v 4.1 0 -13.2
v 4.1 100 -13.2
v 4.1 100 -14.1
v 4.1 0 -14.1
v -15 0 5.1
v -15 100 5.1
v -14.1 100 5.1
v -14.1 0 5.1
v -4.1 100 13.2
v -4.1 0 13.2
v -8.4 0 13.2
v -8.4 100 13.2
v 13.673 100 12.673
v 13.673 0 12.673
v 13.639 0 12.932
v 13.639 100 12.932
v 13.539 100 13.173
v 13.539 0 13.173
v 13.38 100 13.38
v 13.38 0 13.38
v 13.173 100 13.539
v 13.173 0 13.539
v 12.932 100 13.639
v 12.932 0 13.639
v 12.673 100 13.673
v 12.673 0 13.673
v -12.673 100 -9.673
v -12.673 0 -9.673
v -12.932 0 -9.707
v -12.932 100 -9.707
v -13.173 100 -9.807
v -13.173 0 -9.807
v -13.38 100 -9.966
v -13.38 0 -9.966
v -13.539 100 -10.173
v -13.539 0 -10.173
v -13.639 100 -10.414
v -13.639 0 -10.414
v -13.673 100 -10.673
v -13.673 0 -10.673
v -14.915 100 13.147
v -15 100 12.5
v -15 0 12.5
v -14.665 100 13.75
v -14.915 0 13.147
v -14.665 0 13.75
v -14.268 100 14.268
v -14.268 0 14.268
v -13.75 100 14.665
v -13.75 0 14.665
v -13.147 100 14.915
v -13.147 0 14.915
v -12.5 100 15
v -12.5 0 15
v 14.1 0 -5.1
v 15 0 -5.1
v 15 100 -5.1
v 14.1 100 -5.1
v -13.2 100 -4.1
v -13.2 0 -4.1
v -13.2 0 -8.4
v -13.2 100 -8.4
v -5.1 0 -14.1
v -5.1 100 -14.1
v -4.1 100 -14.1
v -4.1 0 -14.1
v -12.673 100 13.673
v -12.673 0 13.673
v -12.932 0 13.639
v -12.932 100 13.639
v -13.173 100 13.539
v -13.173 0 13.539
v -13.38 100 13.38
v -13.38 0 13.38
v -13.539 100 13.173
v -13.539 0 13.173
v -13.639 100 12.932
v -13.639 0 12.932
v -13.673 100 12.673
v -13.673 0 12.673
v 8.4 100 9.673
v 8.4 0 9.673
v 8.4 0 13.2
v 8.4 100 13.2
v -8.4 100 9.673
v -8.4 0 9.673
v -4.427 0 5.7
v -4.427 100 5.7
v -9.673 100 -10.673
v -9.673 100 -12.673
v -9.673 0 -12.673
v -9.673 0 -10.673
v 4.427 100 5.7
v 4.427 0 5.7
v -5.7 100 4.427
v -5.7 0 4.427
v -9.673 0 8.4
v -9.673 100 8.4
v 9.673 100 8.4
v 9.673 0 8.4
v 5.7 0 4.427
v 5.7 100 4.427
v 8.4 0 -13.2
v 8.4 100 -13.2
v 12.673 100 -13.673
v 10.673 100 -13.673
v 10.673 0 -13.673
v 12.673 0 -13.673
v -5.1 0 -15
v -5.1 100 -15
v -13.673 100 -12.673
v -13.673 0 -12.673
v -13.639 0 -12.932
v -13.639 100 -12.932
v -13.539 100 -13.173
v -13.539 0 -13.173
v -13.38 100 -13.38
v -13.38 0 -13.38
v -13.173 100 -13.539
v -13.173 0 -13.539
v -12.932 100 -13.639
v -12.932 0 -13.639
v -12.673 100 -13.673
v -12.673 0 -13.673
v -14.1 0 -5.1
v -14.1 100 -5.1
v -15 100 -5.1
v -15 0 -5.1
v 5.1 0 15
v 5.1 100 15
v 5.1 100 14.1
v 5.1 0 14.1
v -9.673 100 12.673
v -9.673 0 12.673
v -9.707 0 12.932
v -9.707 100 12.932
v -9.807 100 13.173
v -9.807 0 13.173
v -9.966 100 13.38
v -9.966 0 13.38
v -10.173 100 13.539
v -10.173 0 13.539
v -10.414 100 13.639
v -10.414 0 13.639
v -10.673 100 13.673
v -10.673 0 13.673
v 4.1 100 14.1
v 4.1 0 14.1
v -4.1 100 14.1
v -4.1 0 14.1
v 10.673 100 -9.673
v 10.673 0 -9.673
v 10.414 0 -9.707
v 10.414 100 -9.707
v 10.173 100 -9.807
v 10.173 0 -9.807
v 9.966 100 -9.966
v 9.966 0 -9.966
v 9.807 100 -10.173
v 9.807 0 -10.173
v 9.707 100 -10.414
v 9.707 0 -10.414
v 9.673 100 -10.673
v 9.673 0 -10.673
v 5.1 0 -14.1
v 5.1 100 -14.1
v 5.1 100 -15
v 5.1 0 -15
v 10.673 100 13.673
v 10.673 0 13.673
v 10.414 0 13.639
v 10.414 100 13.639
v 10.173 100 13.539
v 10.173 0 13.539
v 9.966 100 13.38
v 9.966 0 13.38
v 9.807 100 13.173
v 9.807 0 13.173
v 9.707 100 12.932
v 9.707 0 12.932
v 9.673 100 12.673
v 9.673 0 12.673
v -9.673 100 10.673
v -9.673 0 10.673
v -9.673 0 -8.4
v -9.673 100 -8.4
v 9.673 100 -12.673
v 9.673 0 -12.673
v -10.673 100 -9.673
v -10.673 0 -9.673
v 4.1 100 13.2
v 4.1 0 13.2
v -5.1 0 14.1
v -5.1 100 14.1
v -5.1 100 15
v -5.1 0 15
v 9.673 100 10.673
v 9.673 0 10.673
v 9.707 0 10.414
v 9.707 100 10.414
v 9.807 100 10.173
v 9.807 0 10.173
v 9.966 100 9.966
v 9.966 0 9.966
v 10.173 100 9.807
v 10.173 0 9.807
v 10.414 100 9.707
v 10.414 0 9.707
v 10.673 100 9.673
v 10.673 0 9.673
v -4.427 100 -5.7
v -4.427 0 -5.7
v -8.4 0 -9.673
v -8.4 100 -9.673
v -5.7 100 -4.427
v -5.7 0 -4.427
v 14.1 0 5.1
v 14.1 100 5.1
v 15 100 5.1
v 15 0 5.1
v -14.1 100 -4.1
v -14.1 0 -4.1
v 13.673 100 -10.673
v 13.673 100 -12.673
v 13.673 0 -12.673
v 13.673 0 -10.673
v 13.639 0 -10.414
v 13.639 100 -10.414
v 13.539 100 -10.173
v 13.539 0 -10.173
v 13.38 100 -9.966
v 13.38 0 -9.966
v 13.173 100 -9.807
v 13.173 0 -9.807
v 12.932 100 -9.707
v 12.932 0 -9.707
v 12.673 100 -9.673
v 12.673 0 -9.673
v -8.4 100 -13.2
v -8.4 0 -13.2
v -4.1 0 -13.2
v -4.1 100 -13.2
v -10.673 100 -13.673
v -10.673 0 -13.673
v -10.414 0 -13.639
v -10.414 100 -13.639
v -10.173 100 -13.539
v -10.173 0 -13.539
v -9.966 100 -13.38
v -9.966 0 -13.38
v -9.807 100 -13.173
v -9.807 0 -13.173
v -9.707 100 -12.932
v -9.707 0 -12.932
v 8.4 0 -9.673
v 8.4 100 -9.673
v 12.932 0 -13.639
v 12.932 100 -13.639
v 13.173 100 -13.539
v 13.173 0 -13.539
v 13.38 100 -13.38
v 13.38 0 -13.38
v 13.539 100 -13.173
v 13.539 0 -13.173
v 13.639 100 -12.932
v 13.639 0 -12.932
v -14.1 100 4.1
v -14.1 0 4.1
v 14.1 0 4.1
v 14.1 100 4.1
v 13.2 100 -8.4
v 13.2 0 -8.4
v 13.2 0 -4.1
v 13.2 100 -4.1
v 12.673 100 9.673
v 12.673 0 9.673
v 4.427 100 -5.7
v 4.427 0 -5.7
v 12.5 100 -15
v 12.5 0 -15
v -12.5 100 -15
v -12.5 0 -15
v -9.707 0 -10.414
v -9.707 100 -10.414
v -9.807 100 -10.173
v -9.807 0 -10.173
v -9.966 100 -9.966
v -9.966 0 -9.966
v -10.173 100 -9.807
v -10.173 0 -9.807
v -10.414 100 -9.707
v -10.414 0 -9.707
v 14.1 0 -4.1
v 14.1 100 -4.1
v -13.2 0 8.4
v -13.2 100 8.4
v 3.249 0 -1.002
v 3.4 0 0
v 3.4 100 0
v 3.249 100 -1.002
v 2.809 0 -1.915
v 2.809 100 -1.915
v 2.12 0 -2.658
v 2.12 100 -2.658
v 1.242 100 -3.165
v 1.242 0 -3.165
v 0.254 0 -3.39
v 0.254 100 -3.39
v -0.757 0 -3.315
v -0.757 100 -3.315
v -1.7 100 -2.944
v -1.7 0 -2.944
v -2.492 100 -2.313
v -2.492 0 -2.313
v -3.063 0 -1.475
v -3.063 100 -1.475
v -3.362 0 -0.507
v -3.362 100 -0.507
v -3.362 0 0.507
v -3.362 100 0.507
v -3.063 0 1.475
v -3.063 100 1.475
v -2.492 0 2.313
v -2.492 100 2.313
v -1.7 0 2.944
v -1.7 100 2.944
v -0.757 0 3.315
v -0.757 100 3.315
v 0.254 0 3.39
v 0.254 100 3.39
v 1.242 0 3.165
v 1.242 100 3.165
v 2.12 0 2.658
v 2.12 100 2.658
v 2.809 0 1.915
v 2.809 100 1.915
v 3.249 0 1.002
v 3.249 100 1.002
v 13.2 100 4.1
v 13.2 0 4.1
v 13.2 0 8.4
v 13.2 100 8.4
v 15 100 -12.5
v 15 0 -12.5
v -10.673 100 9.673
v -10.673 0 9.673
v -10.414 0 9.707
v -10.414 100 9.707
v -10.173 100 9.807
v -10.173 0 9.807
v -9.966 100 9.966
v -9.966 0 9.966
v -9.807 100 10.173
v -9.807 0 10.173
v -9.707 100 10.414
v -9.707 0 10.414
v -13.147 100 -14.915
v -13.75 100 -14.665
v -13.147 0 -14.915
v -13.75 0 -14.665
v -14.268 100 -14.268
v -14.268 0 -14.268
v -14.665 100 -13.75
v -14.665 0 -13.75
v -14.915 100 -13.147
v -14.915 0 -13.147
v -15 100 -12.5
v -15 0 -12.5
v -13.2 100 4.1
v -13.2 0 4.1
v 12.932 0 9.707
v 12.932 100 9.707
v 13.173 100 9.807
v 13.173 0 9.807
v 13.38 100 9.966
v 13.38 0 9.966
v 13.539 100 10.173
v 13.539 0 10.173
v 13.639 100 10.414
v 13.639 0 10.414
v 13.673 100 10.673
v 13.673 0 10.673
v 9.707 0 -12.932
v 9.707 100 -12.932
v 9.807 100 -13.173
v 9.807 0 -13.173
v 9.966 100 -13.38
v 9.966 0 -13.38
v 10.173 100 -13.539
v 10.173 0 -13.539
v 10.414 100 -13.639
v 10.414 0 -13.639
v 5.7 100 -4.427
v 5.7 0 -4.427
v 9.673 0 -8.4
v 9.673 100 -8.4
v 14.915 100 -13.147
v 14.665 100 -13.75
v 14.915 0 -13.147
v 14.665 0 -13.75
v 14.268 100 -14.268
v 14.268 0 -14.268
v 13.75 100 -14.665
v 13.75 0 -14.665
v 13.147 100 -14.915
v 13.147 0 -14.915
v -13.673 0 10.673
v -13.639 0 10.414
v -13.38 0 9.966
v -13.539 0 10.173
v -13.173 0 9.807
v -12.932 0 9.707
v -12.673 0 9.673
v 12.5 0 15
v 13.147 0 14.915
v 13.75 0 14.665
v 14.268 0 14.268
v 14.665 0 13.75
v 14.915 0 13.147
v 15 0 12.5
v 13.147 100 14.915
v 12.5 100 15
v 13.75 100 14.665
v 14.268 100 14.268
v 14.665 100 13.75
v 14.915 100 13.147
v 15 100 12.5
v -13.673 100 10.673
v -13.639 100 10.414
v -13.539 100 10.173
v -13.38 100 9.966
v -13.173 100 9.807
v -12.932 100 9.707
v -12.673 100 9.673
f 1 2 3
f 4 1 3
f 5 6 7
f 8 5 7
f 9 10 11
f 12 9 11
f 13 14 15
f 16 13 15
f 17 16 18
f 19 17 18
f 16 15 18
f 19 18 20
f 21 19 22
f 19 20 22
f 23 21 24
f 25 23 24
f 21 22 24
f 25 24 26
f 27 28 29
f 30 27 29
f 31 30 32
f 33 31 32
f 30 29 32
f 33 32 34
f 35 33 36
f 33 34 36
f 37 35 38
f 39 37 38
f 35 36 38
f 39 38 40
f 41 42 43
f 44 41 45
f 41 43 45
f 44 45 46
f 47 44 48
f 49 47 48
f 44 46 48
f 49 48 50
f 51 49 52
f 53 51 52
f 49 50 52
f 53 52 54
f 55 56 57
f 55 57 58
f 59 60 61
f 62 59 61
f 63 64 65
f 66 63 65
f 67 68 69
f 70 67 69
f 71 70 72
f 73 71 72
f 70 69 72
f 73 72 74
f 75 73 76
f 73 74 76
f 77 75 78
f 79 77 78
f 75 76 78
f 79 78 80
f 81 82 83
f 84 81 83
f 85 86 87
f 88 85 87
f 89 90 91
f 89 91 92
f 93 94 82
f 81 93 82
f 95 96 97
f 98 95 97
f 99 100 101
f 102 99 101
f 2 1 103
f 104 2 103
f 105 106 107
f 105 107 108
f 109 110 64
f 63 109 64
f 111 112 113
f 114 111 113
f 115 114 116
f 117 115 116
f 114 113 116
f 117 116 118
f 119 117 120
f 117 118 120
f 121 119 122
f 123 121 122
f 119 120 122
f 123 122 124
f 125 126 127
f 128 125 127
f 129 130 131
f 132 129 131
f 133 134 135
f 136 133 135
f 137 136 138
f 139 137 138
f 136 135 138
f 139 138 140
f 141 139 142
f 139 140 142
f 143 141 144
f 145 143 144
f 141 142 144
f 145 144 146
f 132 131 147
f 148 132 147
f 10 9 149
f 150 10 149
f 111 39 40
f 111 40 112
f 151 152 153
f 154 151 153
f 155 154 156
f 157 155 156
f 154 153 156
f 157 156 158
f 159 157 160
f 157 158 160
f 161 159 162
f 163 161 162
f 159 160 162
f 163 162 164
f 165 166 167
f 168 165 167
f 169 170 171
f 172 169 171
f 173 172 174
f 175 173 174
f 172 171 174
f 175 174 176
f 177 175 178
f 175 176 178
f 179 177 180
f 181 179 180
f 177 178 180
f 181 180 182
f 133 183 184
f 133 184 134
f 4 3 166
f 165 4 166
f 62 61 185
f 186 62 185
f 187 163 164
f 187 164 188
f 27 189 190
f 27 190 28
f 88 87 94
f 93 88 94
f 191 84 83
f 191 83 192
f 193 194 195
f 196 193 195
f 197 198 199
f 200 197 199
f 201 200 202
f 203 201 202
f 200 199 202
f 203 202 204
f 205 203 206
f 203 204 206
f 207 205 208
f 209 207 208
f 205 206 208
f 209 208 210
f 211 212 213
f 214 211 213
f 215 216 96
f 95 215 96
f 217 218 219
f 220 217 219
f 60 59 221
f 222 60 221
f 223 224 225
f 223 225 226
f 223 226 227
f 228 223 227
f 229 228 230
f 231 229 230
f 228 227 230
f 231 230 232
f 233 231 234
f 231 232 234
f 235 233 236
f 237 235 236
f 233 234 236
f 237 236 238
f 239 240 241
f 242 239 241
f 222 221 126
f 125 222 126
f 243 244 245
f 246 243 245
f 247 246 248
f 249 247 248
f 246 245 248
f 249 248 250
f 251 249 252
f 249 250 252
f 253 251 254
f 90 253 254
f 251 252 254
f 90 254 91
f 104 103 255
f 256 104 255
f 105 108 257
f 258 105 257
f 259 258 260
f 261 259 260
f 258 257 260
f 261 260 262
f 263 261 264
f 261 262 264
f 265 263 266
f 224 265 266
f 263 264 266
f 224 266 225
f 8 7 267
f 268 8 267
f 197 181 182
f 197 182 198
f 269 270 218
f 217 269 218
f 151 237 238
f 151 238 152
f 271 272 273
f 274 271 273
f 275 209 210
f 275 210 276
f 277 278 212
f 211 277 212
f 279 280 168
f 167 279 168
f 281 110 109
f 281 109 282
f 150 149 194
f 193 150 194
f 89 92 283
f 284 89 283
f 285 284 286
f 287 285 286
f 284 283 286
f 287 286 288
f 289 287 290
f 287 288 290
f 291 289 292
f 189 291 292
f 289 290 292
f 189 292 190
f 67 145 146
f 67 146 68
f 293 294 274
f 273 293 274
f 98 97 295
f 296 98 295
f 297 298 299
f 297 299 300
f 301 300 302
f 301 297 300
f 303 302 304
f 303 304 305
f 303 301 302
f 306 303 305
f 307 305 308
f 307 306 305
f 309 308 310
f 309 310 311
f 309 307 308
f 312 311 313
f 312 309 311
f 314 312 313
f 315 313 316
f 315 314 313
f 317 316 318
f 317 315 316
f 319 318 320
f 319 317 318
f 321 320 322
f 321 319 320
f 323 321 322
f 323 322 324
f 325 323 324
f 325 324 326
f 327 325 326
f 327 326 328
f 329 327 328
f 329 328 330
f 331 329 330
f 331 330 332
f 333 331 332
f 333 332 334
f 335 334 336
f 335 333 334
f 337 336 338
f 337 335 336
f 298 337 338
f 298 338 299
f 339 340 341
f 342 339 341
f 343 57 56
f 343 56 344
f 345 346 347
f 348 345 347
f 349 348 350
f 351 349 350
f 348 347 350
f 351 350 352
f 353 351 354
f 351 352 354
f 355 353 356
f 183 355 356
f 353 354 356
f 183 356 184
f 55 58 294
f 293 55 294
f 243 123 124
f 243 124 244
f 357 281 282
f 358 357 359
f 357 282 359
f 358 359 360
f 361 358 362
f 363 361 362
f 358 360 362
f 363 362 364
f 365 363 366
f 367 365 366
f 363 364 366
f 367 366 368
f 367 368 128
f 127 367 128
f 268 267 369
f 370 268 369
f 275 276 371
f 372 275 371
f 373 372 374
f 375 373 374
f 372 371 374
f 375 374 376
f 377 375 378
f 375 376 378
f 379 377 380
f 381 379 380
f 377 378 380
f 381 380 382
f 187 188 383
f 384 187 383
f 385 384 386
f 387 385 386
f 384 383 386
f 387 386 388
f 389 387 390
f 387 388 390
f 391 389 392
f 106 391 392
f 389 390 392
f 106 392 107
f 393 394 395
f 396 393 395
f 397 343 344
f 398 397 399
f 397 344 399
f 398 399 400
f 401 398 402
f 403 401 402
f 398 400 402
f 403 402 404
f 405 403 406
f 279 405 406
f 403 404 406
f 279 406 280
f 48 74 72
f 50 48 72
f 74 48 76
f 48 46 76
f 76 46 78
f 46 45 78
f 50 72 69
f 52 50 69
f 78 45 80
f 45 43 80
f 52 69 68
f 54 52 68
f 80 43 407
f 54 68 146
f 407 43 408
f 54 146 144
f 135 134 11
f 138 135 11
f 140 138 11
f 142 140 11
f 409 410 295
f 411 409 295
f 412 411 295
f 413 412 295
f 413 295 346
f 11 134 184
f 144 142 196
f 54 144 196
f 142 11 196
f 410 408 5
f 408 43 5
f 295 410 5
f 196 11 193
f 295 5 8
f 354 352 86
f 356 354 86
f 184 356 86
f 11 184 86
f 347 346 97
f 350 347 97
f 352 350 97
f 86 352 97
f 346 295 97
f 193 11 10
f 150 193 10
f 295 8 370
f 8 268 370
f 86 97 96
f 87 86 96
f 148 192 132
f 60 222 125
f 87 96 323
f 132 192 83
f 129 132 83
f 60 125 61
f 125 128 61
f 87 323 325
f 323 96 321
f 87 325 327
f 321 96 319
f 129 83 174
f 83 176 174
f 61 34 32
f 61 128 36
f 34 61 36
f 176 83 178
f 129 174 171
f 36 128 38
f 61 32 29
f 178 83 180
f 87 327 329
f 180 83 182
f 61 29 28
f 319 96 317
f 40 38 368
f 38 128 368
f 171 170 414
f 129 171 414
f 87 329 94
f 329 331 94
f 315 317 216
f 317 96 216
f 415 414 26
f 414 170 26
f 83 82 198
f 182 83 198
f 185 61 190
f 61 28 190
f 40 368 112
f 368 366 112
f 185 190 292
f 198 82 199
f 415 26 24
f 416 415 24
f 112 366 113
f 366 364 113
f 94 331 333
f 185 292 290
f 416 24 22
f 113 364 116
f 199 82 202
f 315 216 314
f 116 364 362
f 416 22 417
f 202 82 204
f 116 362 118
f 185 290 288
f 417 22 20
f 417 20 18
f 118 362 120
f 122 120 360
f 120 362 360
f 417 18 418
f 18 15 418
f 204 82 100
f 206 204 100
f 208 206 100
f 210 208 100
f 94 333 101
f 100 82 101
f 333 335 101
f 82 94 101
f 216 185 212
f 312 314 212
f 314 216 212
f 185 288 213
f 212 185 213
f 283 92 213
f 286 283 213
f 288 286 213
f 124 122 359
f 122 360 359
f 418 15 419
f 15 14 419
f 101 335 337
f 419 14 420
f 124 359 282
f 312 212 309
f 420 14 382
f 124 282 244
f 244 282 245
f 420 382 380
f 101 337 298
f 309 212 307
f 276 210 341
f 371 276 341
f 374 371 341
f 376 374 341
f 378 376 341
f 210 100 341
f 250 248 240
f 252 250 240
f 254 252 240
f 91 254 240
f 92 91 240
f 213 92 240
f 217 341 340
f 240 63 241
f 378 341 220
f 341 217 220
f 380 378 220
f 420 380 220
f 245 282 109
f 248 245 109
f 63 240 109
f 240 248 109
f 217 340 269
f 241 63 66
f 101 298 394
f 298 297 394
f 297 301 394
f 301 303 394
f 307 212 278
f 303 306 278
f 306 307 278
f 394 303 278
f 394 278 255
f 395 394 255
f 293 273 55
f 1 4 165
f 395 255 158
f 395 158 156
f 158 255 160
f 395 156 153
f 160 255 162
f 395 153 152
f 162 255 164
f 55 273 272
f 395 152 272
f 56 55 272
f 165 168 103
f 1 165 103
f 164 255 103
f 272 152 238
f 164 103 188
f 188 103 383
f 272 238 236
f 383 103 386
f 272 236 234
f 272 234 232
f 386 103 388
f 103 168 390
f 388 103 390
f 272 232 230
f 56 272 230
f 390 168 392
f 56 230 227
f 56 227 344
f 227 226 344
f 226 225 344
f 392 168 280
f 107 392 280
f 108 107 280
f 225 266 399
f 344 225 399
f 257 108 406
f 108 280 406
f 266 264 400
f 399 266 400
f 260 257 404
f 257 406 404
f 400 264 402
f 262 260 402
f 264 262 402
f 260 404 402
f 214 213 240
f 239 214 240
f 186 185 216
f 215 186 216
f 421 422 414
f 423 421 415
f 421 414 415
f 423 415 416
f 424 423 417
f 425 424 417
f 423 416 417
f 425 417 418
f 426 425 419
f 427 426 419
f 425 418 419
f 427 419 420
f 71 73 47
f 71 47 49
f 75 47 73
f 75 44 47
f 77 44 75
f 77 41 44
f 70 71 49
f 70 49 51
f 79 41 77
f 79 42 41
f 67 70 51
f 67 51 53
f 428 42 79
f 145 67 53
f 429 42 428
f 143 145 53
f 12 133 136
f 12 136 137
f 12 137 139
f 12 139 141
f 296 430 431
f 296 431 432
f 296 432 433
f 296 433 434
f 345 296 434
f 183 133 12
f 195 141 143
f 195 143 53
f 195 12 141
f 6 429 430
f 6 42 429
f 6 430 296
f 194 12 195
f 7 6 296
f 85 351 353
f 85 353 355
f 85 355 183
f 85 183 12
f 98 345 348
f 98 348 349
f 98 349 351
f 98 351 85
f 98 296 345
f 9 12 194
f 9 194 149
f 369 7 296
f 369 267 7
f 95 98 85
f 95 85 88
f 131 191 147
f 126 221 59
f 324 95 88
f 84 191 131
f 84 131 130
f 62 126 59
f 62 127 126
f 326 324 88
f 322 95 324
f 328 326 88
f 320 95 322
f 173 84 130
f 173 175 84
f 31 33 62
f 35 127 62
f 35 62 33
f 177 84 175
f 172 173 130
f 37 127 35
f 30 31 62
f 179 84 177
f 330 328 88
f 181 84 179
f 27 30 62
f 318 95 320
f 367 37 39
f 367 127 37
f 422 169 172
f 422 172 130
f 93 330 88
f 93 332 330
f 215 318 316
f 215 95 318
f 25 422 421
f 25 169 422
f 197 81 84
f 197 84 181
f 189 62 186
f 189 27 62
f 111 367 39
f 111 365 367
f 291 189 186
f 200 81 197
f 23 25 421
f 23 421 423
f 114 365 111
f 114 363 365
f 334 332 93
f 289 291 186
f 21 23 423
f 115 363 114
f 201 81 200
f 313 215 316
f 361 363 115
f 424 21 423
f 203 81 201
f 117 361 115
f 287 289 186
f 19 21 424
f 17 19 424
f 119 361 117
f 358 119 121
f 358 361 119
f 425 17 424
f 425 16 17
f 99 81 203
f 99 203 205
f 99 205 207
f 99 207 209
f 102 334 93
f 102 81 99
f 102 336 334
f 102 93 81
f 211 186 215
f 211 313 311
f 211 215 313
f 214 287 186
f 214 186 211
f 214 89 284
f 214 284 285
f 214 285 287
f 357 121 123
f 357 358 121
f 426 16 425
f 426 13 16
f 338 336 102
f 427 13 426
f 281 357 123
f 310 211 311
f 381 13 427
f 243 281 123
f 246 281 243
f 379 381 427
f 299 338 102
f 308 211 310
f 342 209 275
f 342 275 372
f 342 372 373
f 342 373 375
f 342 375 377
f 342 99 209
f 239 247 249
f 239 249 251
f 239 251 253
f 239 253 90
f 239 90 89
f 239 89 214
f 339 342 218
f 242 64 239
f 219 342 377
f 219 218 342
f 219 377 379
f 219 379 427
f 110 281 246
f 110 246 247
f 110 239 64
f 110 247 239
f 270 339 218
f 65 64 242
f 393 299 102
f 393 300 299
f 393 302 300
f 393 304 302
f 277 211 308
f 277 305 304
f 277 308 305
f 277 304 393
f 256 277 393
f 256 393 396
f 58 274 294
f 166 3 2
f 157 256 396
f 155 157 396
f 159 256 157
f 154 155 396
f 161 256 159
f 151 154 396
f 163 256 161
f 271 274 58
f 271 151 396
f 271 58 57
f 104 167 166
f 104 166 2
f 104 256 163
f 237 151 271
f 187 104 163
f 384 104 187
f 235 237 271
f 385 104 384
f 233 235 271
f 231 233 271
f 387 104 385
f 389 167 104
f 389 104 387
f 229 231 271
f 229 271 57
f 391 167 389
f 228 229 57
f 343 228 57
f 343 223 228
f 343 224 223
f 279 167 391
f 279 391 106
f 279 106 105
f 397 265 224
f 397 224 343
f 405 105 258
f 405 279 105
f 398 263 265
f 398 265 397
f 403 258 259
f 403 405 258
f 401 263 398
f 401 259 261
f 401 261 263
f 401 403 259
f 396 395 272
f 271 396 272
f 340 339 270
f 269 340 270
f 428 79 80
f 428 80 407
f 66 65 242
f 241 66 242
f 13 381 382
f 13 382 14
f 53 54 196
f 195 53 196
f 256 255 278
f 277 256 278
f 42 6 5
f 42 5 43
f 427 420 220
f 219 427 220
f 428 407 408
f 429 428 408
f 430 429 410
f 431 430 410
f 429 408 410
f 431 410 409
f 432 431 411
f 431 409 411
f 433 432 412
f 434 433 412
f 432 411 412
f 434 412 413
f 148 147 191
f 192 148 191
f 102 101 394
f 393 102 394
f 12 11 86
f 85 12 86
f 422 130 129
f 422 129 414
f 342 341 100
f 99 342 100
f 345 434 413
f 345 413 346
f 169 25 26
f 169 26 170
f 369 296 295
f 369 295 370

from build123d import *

# Parameters (mm, degrees)
SKETCH1_R           = 3.4
BOSS_EXTRUDE1_DEPTH = 100
CUT_EXTRUDE1_DEPTH  = 103.225241501
CIRPATTERN1_COUNT   = 4


with BuildPart() as part:
    # Sketch1 → Boss-Extrude1 (new body)
    with BuildSketch(Plane(origin=(0, 0, 0), x_dir=(1, 0, 0), z_dir=(0, 1, 0))):
        with BuildLine():
            ThreePointArc((-15, -12.5), (-14.267766953, -14.267766953), (-12.5, -15))
            Line((-12.5, -15), (12.5, -15))
            ThreePointArc((12.5, -15), (14.267766953, -14.267766953), (15, -12.5))
            Line((15, -12.5), (15, 12.5))
            ThreePointArc((15, 12.5), (14.267766953, 14.267766953), (12.5, 15))
            Line((12.5, 15), (-12.5, 15))
            ThreePointArc((-12.5, 15), (-14.267766953, 14.267766953), (-15, 12.5))
            Line((-15, 12.5), (-15, -12.5))
        make_face()
        with BuildLine():
            Line((-12.672792206, -9.672792206), (-10.672792206, -9.672792206))
            ThreePointArc((-10.672792206, -9.672792206), (-9.965685425, -9.965685425), (-9.672792206, -10.672792206))
            Line((-9.672792206, -10.672792206), (-9.672792206, -12.672792206))
            ThreePointArc((-9.672792206, -12.672792206), (-9.965685425, -13.379898987), (-10.672792206, -13.672792206))
            Line((-10.672792206, -13.672792206), (-12.672792206, -13.672792206))
            ThreePointArc((-12.672792206, -13.672792206), (-13.379898987, -13.379898987), (-13.672792206, -12.672792206))
            Line((-13.672792206, -12.672792206), (-13.672792206, -10.672792206))
            ThreePointArc((-13.672792206, -10.672792206), (-13.379898987, -9.965685425), (-12.672792206, -9.672792206))
        make_face(mode=Mode.SUBTRACT)
        Polygon((-8.4, -9.672792206), (-4.427207794, -5.7), (4.427207794, -5.7), (8.4, -9.672792206), (8.4, -13.2), (-8.4, -13.2), align=None, mode=Mode.SUBTRACT)
        with BuildLine():
            Line((9.672792206, -12.672792206), (9.672792206, -10.672792206))
            ThreePointArc((9.672792206, -10.672792206), (9.965685425, -9.965685425), (10.672792206, -9.672792206))
            Line((10.672792206, -9.672792206), (12.672792206, -9.672792206))
            ThreePointArc((12.672792206, -9.672792206), (13.379898987, -9.965685425), (13.672792206, -10.672792206))
            Line((13.672792206, -10.672792206), (13.672792206, -12.672792206))
            ThreePointArc((13.672792206, -12.672792206), (13.379898987, -13.379898987), (12.672792206, -13.672792206))
            Line((12.672792206, -13.672792206), (10.672792206, -13.672792206))
            ThreePointArc((10.672792206, -13.672792206), (9.965685425, -13.379898987), (9.672792206, -12.672792206))
        make_face(mode=Mode.SUBTRACT)
        Polygon((-5.7, 4.427207794), (-5.7, -4.427207794), (-9.672792206, -8.4), (-13.2, -8.4), (-13.2, 8.4), (-9.672792206, 8.4), align=None, mode=Mode.SUBTRACT)
        with BuildLine():
            Line((-10.672792206, 9.672792206), (-12.672792206, 9.672792206))
            ThreePointArc((-12.672792206, 9.672792206), (-13.379898987, 9.965685425), (-13.672792206, 10.672792206))
            Line((-13.672792206, 10.672792206), (-13.672792206, 12.672792206))
            ThreePointArc((-13.672792206, 12.672792206), (-13.379898987, 13.379898987), (-12.672792206, 13.672792206))
            Line((-12.672792206, 13.672792206), (-10.672792206, 13.672792206))
            ThreePointArc((-10.672792206, 13.672792206), (-9.965685425, 13.379898987), (-9.672792206, 12.672792206))
            Line((-9.672792206, 12.672792206), (-9.672792206, 10.672792206))
            ThreePointArc((-9.672792206, 10.672792206), (-9.965685425, 9.965685425), (-10.672792206, 9.672792206))
        make_face(mode=Mode.SUBTRACT)
        Circle(SKETCH1_R, mode=Mode.SUBTRACT)
        Polygon((9.672792206, 8.4), (13.2, 8.4), (13.2, -8.4), (9.672792206, -8.4), (5.7, -4.427207794), (5.7, 4.427207794), align=None, mode=Mode.SUBTRACT)
        Polygon((4.427207794, 5.7), (-4.427207794, 5.7), (-8.4, 9.672792206), (-8.4, 13.2), (8.4, 13.2), (8.4, 9.672792206), align=None, mode=Mode.SUBTRACT)
        with BuildLine():
            Line((12.672792206, 9.672792206), (10.672792206, 9.672792206))
            ThreePointArc((10.672792206, 9.672792206), (9.965685425, 9.965685425), (9.672792206, 10.672792206))
            Line((9.672792206, 10.672792206), (9.672792206, 12.672792206))
            ThreePointArc((9.672792206, 12.672792206), (9.965685425, 13.379898987), (10.672792206, 13.672792206))
            Line((10.672792206, 13.672792206), (12.672792206, 13.672792206))
            ThreePointArc((12.672792206, 13.672792206), (13.379898987, 13.379898987), (13.672792206, 12.672792206))
            Line((13.672792206, 12.672792206), (13.672792206, 10.672792206))
            ThreePointArc((13.672792206, 10.672792206), (13.379898987, 9.965685425), (12.672792206, 9.672792206))
        make_face(mode=Mode.SUBTRACT)
    extrude(amount=BOSS_EXTRUDE1_DEPTH)

    # Sketch2 → Cut-Extrude1 (cut, through all)
    with BuildSketch(Plane(origin=(0, 100, 0), x_dir=(1, 0, 0), z_dir=(0, 1, 0))):
        Polygon((-4.1, 14.1), (-4.1, 13.2), (4.1, 13.2), (4.1, 14.1), (5.1, 14.1), (5.1, 15), (-5.1, 15), (-5.1, 14.1), align=None)
    cut_extrude1 = extrude(amount=-CUT_EXTRUDE1_DEPTH, mode=Mode.SUBTRACT)

    # CirPattern1: Cut-Extrude1 ×4 about axis
    cirpattern1_axis = Axis((0, 105, 0), (0, -1, 0))
    for i in range(1, CIRPATTERN1_COUNT):
        add(cut_extrude1.rotate(cirpattern1_axis, i * 360 / CIRPATTERN1_COUNT), mode=Mode.SUBTRACT)


solid = part.part
